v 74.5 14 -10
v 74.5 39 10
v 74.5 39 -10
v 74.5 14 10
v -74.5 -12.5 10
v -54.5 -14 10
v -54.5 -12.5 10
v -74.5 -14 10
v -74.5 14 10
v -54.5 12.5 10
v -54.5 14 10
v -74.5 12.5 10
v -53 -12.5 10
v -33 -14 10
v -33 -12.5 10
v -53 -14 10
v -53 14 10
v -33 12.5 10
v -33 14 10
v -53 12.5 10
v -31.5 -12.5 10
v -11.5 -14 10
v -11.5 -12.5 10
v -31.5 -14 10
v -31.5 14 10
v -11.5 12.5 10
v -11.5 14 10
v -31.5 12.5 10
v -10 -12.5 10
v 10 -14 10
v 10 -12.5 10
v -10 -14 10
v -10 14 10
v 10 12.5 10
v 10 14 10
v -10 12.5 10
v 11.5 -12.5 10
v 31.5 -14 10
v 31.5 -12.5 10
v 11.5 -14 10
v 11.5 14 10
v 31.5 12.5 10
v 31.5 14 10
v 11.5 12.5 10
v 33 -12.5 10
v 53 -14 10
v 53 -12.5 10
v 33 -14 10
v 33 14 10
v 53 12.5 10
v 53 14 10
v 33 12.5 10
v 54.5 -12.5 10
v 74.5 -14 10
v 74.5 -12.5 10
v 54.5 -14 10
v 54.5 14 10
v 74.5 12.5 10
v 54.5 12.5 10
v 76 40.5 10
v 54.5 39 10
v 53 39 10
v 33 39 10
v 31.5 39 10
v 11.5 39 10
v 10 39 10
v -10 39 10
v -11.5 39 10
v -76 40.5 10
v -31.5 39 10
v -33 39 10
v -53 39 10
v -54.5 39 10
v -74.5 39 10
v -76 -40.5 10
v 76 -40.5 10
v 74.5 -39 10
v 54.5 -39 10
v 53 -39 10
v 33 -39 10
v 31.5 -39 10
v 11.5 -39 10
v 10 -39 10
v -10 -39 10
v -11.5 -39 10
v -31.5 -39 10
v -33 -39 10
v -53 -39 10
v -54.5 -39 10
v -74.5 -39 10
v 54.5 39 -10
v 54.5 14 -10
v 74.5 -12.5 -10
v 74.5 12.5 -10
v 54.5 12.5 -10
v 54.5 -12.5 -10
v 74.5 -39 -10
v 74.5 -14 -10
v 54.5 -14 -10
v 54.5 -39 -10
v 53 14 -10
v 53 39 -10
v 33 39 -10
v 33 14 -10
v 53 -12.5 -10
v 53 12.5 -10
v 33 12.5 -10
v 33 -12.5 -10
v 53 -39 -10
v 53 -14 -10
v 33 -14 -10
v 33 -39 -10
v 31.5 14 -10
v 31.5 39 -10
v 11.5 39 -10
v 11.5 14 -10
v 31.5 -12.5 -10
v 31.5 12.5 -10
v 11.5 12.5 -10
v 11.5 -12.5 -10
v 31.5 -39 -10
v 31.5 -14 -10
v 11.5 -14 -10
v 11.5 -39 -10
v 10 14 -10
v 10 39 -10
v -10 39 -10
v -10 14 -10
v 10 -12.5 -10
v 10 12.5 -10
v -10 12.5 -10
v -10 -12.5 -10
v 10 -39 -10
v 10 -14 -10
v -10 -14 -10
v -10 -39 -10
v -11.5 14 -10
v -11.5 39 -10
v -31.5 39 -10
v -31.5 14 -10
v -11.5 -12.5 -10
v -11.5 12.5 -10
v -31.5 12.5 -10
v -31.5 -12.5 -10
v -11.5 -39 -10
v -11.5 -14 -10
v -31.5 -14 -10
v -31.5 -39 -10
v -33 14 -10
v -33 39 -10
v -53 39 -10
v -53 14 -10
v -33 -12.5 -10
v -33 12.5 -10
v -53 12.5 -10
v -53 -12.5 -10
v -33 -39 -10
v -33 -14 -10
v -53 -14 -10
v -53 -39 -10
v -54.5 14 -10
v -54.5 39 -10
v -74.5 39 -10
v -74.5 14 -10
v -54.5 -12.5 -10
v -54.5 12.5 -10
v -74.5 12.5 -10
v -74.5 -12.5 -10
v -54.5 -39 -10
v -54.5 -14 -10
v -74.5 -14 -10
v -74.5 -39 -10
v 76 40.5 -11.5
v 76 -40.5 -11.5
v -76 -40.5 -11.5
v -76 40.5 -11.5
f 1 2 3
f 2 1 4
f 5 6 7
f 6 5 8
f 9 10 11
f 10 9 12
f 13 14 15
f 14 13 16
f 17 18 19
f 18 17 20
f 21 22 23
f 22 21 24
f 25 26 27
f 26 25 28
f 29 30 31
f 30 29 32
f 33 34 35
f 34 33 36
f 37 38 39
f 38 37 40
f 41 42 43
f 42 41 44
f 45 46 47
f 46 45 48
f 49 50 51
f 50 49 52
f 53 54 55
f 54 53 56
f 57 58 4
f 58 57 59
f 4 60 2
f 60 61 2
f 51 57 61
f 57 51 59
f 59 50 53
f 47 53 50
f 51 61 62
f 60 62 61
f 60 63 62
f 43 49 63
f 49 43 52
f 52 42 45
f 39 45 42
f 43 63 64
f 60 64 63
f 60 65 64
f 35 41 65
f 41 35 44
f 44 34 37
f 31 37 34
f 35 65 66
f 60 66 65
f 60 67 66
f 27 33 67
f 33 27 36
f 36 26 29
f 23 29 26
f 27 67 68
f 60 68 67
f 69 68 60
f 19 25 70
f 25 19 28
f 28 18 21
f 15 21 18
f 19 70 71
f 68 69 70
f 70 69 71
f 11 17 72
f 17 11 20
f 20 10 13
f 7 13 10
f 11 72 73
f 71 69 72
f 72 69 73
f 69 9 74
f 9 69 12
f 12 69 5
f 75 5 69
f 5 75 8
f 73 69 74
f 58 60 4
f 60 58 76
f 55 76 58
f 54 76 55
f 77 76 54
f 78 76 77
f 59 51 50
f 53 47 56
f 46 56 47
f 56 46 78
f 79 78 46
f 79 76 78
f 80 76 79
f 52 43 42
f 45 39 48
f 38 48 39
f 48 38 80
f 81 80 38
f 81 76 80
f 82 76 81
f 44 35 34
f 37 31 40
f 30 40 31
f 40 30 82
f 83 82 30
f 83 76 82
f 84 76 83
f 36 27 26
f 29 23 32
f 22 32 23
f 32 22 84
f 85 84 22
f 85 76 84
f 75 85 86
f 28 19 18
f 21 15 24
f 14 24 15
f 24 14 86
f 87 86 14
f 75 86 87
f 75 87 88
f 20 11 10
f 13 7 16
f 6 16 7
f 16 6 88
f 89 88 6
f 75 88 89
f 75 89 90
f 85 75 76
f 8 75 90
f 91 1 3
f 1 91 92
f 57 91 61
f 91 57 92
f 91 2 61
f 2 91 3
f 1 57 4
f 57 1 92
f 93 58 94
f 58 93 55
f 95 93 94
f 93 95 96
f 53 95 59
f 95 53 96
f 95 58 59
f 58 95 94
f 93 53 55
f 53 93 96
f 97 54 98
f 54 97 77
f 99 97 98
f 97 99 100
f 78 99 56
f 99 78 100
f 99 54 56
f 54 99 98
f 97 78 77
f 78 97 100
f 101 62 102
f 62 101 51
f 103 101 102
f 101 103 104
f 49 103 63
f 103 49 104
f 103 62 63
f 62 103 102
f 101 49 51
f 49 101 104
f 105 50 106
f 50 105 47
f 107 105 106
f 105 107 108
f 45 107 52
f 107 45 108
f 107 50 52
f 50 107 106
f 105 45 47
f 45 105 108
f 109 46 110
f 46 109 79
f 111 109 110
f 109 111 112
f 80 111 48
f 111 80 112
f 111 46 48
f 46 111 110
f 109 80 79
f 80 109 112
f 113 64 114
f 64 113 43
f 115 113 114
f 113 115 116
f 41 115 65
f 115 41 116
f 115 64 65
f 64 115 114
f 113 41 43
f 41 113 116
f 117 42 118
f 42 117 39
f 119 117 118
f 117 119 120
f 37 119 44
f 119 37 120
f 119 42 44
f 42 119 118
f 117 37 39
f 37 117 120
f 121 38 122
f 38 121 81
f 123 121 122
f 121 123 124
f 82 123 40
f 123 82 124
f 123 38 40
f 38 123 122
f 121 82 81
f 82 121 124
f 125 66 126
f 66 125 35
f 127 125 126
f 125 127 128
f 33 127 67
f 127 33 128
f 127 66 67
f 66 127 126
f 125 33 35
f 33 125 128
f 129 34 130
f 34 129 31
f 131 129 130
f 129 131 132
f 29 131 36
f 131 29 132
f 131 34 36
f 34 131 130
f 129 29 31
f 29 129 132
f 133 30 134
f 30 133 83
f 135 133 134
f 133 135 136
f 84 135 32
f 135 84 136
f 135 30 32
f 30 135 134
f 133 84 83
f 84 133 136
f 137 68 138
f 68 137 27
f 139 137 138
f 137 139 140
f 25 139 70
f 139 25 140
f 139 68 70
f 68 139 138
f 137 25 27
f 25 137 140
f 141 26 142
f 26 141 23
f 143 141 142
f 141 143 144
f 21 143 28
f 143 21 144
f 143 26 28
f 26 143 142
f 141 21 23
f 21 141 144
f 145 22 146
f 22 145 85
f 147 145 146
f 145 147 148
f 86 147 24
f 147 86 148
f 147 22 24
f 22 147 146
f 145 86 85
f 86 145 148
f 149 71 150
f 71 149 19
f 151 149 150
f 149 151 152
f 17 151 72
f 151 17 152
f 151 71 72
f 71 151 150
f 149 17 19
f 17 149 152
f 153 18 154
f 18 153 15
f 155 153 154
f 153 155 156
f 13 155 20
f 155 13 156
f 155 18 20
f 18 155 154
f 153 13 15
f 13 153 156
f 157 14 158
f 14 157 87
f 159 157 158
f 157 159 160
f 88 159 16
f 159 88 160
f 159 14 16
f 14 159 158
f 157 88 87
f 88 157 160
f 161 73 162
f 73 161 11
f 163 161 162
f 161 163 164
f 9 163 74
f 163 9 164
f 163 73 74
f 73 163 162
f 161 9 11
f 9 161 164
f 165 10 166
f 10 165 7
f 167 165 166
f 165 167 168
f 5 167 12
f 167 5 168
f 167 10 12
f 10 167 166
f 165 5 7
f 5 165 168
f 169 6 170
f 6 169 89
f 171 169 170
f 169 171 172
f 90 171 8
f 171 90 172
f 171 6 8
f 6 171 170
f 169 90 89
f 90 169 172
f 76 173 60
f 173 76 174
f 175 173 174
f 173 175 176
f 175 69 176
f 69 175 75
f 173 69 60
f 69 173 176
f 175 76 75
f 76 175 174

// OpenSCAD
// file: config.scad
// Config for the model

COLUMNS = 7;
ROWS = 3;
CELL_WIDTH = 20;
CELL_HEIGHT = 20;
CELL_DEPTH = 25;
BORDER_SIZE = 1.5;  // This also controls ceilings and floors.
ERROR_MARGIN = 0.4; // Printer error margin.

// Do not touch anything after this.

container_width = (CELL_WIDTH+BORDER_SIZE)*COLUMNS + BORDER_SIZE;
container_depth = (CELL_DEPTH+BORDER_SIZE)*ROWS + BORDER_SIZE;
container_height = CELL_HEIGHT + BORDER_SIZE;
// main file
include <config.scad>

difference () {
  translate([0, 0, -BORDER_SIZE/2])
    cube([container_width, container_depth, container_height], center = true);
  for (i = [0:COLUMNS-1]) {
    cell_x = container_width/2 - (CELL_WIDTH + BORDER_SIZE)*i - CELL_WIDTH/2 - BORDER_SIZE;
    for (j = [0:ROWS-1]) {
      cell_y = container_depth/2 - (CELL_DEPTH + BORDER_SIZE)*j - CELL_DEPTH/2 - BORDER_SIZE;
      translate([cell_x, cell_y, 0])
        cube([CELL_WIDTH, CELL_DEPTH, CELL_HEIGHT], center = true);
    }
  }
}
